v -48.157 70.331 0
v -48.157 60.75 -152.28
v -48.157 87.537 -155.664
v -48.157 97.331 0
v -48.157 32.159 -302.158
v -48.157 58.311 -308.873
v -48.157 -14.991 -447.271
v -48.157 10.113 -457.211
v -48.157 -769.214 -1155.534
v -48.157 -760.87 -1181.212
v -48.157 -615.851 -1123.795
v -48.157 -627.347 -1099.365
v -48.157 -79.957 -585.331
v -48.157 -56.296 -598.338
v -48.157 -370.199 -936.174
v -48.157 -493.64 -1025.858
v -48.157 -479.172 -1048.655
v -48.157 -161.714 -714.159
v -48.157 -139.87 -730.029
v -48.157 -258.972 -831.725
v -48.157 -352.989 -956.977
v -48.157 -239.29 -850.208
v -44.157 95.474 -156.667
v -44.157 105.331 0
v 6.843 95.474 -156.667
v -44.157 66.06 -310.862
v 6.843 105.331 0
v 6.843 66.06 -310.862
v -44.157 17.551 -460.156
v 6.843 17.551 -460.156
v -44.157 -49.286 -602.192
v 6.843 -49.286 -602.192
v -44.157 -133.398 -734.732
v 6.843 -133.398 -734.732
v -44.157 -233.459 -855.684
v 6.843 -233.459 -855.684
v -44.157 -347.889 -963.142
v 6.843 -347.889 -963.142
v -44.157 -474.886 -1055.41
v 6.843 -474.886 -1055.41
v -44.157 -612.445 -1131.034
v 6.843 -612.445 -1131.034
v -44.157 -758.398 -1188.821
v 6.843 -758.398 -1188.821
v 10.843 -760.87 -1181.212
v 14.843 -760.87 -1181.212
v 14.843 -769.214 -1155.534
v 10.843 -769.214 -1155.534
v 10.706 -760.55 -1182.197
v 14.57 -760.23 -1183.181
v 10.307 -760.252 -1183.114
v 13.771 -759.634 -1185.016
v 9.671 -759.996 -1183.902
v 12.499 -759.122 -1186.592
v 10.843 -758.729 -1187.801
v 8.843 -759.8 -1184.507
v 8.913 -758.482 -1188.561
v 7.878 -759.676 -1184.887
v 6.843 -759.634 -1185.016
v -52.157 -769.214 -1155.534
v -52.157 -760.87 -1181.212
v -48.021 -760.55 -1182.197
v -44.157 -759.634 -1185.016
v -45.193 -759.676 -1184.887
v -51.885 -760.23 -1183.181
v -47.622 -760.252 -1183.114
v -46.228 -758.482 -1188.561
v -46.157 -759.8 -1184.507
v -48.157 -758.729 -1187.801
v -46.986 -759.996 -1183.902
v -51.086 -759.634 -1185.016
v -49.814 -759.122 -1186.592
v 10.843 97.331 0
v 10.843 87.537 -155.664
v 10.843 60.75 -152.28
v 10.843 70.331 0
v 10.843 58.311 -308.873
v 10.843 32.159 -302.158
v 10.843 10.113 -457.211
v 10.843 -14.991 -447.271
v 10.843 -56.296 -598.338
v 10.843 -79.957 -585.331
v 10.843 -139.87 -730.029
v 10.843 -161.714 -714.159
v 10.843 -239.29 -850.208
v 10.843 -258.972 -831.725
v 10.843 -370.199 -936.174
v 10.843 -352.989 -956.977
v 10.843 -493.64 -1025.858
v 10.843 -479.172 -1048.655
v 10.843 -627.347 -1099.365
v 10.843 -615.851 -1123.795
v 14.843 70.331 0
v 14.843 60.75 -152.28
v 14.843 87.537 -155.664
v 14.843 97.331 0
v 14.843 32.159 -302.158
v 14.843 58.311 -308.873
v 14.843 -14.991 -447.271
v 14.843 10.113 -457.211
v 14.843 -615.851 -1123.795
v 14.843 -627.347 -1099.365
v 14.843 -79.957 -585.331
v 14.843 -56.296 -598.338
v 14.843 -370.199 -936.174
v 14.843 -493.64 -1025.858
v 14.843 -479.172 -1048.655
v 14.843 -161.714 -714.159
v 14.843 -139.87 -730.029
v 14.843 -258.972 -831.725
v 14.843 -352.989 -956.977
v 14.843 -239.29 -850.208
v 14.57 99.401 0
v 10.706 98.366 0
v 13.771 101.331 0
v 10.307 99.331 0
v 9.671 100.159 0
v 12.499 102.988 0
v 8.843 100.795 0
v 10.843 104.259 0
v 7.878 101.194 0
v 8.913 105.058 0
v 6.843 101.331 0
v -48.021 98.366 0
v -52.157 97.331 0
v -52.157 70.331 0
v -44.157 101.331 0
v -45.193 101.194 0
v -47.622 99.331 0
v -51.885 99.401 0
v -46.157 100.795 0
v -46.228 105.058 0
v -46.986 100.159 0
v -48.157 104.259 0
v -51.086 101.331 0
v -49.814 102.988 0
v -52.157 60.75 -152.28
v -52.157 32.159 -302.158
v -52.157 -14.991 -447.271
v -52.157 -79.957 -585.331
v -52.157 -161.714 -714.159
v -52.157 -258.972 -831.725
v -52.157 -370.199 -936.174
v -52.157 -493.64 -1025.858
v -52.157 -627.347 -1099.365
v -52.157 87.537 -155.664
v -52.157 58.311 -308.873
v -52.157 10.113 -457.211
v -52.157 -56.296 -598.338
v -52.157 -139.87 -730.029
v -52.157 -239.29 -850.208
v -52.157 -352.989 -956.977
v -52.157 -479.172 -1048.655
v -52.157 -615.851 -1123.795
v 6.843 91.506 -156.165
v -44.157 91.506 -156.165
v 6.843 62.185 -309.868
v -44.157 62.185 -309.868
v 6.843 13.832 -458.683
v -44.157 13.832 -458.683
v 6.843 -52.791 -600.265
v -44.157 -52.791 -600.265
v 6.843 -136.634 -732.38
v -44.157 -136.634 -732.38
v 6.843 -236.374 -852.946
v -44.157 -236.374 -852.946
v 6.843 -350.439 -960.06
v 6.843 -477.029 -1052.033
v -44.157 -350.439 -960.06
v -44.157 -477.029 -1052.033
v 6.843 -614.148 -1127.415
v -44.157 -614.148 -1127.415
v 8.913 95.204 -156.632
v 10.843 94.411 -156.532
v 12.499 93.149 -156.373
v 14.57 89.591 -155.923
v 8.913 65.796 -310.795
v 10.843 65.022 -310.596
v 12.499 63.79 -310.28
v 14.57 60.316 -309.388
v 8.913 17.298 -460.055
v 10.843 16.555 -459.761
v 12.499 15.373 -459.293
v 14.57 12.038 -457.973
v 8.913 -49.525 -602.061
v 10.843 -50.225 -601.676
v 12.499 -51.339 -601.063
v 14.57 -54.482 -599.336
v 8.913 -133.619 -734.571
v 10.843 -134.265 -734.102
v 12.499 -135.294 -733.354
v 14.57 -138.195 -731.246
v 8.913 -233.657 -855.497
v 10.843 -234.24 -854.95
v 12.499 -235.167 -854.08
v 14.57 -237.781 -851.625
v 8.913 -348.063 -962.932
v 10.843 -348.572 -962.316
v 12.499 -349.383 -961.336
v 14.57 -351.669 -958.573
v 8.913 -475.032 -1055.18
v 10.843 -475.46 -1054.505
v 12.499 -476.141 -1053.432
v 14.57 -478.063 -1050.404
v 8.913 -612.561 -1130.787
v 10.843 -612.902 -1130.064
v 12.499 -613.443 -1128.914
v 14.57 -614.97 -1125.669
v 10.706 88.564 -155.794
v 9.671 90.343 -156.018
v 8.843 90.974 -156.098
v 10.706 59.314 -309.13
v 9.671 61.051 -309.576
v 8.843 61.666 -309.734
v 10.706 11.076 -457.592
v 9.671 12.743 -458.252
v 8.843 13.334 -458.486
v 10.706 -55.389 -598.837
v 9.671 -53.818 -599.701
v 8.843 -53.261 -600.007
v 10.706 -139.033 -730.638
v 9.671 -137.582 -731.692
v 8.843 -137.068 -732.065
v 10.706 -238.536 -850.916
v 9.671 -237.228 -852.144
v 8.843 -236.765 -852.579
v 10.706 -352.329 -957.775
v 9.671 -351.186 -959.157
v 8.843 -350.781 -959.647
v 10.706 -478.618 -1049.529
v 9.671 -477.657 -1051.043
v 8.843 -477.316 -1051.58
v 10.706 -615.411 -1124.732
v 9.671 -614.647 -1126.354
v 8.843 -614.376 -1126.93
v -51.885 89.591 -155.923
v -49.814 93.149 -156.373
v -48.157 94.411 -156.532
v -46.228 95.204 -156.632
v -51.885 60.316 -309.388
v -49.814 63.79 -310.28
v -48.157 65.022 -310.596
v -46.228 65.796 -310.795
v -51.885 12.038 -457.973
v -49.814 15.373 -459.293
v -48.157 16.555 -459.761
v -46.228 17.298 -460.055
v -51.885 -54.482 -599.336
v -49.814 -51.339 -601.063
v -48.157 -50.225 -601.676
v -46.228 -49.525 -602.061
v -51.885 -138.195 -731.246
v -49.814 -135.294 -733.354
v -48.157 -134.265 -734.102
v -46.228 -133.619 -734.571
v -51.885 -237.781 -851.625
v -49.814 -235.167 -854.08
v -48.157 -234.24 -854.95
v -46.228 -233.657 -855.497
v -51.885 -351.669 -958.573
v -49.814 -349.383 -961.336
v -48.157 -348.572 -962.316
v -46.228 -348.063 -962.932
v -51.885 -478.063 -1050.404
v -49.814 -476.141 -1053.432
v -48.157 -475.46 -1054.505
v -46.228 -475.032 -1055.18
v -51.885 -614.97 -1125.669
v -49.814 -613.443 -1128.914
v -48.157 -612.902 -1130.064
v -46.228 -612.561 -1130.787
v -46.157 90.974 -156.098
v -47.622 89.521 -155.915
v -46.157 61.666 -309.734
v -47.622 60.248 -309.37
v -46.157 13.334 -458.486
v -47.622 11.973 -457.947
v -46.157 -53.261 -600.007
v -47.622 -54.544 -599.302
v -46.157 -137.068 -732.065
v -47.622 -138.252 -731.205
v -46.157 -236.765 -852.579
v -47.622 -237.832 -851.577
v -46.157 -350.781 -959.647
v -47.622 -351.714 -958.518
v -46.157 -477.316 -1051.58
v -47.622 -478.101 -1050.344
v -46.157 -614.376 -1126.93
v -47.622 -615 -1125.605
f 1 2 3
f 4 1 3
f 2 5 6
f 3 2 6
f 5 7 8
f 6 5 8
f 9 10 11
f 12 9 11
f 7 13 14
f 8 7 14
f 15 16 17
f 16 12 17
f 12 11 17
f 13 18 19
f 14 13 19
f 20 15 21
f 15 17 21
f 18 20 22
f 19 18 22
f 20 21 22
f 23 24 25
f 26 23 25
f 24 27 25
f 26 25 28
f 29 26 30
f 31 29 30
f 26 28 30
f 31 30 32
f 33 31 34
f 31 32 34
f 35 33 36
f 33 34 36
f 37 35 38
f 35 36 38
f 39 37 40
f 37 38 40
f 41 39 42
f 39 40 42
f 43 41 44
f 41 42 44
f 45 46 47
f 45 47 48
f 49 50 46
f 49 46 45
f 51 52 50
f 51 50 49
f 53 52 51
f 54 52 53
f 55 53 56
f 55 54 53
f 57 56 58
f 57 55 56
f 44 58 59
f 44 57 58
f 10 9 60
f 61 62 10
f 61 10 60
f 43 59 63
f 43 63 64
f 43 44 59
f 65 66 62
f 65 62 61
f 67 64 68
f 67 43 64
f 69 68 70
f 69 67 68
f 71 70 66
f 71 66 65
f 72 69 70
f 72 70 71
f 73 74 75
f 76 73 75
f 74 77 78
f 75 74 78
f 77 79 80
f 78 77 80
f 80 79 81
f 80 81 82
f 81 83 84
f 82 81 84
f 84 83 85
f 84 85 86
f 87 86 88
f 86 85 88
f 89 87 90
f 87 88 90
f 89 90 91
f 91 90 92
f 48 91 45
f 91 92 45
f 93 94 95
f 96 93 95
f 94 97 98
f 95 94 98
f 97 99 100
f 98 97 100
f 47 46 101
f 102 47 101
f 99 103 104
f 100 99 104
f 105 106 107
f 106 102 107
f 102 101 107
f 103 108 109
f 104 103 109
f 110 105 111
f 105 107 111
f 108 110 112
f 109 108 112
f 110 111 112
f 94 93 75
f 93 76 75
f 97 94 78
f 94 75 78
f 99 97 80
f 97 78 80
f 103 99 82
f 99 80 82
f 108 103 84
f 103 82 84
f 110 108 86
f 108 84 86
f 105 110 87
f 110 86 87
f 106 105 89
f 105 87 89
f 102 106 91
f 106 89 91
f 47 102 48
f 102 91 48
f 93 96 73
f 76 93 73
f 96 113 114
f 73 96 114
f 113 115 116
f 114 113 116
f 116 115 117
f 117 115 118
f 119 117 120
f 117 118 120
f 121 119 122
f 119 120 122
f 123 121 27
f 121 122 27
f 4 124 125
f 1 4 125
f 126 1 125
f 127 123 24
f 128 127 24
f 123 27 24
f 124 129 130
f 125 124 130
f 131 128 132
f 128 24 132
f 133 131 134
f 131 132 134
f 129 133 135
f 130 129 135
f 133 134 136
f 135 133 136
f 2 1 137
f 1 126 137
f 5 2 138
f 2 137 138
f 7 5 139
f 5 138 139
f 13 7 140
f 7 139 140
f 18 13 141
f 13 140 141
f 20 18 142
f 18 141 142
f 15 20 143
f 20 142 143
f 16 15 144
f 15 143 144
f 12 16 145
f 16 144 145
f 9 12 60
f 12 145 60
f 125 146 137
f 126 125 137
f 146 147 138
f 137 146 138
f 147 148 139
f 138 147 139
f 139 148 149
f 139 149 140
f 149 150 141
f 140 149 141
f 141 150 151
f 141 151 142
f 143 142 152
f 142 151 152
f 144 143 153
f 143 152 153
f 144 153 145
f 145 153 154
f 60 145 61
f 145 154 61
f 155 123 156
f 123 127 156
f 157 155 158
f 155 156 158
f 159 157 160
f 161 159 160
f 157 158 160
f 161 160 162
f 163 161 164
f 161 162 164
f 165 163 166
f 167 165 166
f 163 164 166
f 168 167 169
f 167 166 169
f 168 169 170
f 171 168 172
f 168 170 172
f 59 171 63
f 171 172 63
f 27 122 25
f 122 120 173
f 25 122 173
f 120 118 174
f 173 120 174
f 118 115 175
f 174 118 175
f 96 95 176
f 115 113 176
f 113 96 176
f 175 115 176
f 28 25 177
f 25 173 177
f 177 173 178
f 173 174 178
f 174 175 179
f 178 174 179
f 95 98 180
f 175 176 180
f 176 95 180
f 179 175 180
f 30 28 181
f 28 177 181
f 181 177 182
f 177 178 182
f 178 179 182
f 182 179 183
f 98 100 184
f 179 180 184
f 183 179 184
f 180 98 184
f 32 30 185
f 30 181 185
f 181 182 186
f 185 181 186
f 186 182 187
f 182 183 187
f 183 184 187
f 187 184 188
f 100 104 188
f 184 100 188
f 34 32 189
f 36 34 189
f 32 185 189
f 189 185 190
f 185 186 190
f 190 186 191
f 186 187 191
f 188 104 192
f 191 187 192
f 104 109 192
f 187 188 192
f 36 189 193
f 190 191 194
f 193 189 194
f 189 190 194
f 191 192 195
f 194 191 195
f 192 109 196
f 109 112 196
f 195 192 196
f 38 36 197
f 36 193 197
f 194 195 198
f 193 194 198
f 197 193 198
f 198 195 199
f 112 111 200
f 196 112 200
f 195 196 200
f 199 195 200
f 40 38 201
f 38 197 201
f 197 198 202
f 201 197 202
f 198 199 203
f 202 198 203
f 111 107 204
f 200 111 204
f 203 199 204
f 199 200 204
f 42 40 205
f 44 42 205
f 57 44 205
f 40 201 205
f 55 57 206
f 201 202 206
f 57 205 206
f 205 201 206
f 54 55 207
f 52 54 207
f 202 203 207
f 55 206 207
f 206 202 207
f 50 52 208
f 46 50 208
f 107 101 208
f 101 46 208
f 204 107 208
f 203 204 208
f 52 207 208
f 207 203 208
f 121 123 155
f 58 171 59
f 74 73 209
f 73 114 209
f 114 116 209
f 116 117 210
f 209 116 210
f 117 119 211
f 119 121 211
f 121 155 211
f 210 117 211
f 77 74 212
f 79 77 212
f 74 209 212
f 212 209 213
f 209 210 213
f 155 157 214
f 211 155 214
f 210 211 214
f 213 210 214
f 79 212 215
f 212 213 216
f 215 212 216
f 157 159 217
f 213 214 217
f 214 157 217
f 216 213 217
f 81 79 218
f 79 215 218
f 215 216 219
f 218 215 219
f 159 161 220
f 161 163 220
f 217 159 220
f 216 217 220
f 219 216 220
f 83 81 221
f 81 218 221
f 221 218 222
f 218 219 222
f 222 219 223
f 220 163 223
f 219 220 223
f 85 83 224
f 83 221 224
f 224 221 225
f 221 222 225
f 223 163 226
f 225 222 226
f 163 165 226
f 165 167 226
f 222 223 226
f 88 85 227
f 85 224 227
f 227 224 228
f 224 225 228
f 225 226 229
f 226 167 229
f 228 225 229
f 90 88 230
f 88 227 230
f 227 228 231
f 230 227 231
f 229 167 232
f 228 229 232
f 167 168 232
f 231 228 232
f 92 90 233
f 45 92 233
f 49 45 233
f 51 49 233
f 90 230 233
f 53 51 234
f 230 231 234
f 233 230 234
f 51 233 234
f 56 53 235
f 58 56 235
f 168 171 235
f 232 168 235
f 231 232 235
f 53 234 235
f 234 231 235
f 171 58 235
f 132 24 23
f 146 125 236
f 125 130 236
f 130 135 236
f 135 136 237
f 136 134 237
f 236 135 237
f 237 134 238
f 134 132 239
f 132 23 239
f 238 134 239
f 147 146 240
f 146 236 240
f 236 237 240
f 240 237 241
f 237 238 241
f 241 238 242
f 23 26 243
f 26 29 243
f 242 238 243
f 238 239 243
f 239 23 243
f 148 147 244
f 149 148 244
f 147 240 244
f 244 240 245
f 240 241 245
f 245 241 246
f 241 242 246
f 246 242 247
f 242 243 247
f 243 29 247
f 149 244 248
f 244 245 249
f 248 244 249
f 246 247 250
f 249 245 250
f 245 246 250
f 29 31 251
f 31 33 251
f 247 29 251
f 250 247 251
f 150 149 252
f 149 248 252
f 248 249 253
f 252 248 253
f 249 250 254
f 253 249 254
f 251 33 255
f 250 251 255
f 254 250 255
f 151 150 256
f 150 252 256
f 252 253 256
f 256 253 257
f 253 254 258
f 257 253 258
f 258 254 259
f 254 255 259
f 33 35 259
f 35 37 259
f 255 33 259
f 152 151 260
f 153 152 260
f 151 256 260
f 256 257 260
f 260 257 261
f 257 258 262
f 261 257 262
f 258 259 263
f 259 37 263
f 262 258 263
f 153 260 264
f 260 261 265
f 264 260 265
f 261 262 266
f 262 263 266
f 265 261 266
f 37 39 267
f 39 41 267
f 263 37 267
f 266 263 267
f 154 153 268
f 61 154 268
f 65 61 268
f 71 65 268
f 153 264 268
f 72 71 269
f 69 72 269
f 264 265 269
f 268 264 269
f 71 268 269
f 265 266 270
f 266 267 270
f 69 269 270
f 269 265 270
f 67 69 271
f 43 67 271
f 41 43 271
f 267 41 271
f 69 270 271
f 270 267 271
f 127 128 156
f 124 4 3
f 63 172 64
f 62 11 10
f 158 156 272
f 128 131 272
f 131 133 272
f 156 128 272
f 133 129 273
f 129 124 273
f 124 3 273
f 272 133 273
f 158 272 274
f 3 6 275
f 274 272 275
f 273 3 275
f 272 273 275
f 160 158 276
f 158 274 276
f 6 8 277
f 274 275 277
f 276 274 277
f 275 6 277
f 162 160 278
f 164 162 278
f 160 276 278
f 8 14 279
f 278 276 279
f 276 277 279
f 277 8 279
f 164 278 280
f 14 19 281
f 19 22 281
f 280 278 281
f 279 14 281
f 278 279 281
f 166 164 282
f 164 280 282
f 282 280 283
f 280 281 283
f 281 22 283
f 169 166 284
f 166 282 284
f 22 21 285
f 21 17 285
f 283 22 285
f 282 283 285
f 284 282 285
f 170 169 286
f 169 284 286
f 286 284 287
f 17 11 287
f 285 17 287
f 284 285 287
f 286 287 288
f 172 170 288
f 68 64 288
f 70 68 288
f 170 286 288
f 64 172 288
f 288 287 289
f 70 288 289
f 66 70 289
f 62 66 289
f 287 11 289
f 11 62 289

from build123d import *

# Parameters (mm, degrees)
REVOLVE1_ANGLE = 72


with BuildPart() as part:
    # Sketch1 → Revolve1 (revolve)
    with BuildSketch(Plane.XY):
        with BuildLine():
            ThreePointArc((-52.157480315, 97.330708661), (-49.814334564, 102.987562911), (-44.157480315, 105.330708661))
            Line((-44.157480315, 105.330708661), (6.842519685, 105.330708661))
            ThreePointArc((6.842519685, 105.330708661), (12.499373935, 102.987562911), (14.842519685, 97.330708661))
            Line((14.842519685, 97.330708661), (14.842519685, 70.330708661))
            Line((14.842519685, 70.330708661), (10.842519685, 70.330708661))
            Line((10.842519685, 70.330708661), (10.842519685, 97.330708661))
            ThreePointArc((10.842519685, 97.330708661), (9.67094681, 100.159135786), (6.842519685, 101.330708661))
            Line((6.842519685, 101.330708661), (-44.157480315, 101.330708661))
            ThreePointArc((-44.157480315, 101.330708661), (-46.98590744, 100.159135786), (-48.157480315, 97.330708661))
            Line((-48.157480315, 97.330708661), (-48.157480315, 70.330708661))
            Line((-48.157480315, 70.330708661), (-52.157480315, 70.330708661))
            Line((-52.157480315, 70.330708661), (-52.157480315, 97.330708661))
        make_face()
    revolve(axis=Axis((14.842519685, -1144.669291339, 0), (-1, 0, 0)), revolution_arc=REVOLVE1_ANGLE)


solid = part.part
